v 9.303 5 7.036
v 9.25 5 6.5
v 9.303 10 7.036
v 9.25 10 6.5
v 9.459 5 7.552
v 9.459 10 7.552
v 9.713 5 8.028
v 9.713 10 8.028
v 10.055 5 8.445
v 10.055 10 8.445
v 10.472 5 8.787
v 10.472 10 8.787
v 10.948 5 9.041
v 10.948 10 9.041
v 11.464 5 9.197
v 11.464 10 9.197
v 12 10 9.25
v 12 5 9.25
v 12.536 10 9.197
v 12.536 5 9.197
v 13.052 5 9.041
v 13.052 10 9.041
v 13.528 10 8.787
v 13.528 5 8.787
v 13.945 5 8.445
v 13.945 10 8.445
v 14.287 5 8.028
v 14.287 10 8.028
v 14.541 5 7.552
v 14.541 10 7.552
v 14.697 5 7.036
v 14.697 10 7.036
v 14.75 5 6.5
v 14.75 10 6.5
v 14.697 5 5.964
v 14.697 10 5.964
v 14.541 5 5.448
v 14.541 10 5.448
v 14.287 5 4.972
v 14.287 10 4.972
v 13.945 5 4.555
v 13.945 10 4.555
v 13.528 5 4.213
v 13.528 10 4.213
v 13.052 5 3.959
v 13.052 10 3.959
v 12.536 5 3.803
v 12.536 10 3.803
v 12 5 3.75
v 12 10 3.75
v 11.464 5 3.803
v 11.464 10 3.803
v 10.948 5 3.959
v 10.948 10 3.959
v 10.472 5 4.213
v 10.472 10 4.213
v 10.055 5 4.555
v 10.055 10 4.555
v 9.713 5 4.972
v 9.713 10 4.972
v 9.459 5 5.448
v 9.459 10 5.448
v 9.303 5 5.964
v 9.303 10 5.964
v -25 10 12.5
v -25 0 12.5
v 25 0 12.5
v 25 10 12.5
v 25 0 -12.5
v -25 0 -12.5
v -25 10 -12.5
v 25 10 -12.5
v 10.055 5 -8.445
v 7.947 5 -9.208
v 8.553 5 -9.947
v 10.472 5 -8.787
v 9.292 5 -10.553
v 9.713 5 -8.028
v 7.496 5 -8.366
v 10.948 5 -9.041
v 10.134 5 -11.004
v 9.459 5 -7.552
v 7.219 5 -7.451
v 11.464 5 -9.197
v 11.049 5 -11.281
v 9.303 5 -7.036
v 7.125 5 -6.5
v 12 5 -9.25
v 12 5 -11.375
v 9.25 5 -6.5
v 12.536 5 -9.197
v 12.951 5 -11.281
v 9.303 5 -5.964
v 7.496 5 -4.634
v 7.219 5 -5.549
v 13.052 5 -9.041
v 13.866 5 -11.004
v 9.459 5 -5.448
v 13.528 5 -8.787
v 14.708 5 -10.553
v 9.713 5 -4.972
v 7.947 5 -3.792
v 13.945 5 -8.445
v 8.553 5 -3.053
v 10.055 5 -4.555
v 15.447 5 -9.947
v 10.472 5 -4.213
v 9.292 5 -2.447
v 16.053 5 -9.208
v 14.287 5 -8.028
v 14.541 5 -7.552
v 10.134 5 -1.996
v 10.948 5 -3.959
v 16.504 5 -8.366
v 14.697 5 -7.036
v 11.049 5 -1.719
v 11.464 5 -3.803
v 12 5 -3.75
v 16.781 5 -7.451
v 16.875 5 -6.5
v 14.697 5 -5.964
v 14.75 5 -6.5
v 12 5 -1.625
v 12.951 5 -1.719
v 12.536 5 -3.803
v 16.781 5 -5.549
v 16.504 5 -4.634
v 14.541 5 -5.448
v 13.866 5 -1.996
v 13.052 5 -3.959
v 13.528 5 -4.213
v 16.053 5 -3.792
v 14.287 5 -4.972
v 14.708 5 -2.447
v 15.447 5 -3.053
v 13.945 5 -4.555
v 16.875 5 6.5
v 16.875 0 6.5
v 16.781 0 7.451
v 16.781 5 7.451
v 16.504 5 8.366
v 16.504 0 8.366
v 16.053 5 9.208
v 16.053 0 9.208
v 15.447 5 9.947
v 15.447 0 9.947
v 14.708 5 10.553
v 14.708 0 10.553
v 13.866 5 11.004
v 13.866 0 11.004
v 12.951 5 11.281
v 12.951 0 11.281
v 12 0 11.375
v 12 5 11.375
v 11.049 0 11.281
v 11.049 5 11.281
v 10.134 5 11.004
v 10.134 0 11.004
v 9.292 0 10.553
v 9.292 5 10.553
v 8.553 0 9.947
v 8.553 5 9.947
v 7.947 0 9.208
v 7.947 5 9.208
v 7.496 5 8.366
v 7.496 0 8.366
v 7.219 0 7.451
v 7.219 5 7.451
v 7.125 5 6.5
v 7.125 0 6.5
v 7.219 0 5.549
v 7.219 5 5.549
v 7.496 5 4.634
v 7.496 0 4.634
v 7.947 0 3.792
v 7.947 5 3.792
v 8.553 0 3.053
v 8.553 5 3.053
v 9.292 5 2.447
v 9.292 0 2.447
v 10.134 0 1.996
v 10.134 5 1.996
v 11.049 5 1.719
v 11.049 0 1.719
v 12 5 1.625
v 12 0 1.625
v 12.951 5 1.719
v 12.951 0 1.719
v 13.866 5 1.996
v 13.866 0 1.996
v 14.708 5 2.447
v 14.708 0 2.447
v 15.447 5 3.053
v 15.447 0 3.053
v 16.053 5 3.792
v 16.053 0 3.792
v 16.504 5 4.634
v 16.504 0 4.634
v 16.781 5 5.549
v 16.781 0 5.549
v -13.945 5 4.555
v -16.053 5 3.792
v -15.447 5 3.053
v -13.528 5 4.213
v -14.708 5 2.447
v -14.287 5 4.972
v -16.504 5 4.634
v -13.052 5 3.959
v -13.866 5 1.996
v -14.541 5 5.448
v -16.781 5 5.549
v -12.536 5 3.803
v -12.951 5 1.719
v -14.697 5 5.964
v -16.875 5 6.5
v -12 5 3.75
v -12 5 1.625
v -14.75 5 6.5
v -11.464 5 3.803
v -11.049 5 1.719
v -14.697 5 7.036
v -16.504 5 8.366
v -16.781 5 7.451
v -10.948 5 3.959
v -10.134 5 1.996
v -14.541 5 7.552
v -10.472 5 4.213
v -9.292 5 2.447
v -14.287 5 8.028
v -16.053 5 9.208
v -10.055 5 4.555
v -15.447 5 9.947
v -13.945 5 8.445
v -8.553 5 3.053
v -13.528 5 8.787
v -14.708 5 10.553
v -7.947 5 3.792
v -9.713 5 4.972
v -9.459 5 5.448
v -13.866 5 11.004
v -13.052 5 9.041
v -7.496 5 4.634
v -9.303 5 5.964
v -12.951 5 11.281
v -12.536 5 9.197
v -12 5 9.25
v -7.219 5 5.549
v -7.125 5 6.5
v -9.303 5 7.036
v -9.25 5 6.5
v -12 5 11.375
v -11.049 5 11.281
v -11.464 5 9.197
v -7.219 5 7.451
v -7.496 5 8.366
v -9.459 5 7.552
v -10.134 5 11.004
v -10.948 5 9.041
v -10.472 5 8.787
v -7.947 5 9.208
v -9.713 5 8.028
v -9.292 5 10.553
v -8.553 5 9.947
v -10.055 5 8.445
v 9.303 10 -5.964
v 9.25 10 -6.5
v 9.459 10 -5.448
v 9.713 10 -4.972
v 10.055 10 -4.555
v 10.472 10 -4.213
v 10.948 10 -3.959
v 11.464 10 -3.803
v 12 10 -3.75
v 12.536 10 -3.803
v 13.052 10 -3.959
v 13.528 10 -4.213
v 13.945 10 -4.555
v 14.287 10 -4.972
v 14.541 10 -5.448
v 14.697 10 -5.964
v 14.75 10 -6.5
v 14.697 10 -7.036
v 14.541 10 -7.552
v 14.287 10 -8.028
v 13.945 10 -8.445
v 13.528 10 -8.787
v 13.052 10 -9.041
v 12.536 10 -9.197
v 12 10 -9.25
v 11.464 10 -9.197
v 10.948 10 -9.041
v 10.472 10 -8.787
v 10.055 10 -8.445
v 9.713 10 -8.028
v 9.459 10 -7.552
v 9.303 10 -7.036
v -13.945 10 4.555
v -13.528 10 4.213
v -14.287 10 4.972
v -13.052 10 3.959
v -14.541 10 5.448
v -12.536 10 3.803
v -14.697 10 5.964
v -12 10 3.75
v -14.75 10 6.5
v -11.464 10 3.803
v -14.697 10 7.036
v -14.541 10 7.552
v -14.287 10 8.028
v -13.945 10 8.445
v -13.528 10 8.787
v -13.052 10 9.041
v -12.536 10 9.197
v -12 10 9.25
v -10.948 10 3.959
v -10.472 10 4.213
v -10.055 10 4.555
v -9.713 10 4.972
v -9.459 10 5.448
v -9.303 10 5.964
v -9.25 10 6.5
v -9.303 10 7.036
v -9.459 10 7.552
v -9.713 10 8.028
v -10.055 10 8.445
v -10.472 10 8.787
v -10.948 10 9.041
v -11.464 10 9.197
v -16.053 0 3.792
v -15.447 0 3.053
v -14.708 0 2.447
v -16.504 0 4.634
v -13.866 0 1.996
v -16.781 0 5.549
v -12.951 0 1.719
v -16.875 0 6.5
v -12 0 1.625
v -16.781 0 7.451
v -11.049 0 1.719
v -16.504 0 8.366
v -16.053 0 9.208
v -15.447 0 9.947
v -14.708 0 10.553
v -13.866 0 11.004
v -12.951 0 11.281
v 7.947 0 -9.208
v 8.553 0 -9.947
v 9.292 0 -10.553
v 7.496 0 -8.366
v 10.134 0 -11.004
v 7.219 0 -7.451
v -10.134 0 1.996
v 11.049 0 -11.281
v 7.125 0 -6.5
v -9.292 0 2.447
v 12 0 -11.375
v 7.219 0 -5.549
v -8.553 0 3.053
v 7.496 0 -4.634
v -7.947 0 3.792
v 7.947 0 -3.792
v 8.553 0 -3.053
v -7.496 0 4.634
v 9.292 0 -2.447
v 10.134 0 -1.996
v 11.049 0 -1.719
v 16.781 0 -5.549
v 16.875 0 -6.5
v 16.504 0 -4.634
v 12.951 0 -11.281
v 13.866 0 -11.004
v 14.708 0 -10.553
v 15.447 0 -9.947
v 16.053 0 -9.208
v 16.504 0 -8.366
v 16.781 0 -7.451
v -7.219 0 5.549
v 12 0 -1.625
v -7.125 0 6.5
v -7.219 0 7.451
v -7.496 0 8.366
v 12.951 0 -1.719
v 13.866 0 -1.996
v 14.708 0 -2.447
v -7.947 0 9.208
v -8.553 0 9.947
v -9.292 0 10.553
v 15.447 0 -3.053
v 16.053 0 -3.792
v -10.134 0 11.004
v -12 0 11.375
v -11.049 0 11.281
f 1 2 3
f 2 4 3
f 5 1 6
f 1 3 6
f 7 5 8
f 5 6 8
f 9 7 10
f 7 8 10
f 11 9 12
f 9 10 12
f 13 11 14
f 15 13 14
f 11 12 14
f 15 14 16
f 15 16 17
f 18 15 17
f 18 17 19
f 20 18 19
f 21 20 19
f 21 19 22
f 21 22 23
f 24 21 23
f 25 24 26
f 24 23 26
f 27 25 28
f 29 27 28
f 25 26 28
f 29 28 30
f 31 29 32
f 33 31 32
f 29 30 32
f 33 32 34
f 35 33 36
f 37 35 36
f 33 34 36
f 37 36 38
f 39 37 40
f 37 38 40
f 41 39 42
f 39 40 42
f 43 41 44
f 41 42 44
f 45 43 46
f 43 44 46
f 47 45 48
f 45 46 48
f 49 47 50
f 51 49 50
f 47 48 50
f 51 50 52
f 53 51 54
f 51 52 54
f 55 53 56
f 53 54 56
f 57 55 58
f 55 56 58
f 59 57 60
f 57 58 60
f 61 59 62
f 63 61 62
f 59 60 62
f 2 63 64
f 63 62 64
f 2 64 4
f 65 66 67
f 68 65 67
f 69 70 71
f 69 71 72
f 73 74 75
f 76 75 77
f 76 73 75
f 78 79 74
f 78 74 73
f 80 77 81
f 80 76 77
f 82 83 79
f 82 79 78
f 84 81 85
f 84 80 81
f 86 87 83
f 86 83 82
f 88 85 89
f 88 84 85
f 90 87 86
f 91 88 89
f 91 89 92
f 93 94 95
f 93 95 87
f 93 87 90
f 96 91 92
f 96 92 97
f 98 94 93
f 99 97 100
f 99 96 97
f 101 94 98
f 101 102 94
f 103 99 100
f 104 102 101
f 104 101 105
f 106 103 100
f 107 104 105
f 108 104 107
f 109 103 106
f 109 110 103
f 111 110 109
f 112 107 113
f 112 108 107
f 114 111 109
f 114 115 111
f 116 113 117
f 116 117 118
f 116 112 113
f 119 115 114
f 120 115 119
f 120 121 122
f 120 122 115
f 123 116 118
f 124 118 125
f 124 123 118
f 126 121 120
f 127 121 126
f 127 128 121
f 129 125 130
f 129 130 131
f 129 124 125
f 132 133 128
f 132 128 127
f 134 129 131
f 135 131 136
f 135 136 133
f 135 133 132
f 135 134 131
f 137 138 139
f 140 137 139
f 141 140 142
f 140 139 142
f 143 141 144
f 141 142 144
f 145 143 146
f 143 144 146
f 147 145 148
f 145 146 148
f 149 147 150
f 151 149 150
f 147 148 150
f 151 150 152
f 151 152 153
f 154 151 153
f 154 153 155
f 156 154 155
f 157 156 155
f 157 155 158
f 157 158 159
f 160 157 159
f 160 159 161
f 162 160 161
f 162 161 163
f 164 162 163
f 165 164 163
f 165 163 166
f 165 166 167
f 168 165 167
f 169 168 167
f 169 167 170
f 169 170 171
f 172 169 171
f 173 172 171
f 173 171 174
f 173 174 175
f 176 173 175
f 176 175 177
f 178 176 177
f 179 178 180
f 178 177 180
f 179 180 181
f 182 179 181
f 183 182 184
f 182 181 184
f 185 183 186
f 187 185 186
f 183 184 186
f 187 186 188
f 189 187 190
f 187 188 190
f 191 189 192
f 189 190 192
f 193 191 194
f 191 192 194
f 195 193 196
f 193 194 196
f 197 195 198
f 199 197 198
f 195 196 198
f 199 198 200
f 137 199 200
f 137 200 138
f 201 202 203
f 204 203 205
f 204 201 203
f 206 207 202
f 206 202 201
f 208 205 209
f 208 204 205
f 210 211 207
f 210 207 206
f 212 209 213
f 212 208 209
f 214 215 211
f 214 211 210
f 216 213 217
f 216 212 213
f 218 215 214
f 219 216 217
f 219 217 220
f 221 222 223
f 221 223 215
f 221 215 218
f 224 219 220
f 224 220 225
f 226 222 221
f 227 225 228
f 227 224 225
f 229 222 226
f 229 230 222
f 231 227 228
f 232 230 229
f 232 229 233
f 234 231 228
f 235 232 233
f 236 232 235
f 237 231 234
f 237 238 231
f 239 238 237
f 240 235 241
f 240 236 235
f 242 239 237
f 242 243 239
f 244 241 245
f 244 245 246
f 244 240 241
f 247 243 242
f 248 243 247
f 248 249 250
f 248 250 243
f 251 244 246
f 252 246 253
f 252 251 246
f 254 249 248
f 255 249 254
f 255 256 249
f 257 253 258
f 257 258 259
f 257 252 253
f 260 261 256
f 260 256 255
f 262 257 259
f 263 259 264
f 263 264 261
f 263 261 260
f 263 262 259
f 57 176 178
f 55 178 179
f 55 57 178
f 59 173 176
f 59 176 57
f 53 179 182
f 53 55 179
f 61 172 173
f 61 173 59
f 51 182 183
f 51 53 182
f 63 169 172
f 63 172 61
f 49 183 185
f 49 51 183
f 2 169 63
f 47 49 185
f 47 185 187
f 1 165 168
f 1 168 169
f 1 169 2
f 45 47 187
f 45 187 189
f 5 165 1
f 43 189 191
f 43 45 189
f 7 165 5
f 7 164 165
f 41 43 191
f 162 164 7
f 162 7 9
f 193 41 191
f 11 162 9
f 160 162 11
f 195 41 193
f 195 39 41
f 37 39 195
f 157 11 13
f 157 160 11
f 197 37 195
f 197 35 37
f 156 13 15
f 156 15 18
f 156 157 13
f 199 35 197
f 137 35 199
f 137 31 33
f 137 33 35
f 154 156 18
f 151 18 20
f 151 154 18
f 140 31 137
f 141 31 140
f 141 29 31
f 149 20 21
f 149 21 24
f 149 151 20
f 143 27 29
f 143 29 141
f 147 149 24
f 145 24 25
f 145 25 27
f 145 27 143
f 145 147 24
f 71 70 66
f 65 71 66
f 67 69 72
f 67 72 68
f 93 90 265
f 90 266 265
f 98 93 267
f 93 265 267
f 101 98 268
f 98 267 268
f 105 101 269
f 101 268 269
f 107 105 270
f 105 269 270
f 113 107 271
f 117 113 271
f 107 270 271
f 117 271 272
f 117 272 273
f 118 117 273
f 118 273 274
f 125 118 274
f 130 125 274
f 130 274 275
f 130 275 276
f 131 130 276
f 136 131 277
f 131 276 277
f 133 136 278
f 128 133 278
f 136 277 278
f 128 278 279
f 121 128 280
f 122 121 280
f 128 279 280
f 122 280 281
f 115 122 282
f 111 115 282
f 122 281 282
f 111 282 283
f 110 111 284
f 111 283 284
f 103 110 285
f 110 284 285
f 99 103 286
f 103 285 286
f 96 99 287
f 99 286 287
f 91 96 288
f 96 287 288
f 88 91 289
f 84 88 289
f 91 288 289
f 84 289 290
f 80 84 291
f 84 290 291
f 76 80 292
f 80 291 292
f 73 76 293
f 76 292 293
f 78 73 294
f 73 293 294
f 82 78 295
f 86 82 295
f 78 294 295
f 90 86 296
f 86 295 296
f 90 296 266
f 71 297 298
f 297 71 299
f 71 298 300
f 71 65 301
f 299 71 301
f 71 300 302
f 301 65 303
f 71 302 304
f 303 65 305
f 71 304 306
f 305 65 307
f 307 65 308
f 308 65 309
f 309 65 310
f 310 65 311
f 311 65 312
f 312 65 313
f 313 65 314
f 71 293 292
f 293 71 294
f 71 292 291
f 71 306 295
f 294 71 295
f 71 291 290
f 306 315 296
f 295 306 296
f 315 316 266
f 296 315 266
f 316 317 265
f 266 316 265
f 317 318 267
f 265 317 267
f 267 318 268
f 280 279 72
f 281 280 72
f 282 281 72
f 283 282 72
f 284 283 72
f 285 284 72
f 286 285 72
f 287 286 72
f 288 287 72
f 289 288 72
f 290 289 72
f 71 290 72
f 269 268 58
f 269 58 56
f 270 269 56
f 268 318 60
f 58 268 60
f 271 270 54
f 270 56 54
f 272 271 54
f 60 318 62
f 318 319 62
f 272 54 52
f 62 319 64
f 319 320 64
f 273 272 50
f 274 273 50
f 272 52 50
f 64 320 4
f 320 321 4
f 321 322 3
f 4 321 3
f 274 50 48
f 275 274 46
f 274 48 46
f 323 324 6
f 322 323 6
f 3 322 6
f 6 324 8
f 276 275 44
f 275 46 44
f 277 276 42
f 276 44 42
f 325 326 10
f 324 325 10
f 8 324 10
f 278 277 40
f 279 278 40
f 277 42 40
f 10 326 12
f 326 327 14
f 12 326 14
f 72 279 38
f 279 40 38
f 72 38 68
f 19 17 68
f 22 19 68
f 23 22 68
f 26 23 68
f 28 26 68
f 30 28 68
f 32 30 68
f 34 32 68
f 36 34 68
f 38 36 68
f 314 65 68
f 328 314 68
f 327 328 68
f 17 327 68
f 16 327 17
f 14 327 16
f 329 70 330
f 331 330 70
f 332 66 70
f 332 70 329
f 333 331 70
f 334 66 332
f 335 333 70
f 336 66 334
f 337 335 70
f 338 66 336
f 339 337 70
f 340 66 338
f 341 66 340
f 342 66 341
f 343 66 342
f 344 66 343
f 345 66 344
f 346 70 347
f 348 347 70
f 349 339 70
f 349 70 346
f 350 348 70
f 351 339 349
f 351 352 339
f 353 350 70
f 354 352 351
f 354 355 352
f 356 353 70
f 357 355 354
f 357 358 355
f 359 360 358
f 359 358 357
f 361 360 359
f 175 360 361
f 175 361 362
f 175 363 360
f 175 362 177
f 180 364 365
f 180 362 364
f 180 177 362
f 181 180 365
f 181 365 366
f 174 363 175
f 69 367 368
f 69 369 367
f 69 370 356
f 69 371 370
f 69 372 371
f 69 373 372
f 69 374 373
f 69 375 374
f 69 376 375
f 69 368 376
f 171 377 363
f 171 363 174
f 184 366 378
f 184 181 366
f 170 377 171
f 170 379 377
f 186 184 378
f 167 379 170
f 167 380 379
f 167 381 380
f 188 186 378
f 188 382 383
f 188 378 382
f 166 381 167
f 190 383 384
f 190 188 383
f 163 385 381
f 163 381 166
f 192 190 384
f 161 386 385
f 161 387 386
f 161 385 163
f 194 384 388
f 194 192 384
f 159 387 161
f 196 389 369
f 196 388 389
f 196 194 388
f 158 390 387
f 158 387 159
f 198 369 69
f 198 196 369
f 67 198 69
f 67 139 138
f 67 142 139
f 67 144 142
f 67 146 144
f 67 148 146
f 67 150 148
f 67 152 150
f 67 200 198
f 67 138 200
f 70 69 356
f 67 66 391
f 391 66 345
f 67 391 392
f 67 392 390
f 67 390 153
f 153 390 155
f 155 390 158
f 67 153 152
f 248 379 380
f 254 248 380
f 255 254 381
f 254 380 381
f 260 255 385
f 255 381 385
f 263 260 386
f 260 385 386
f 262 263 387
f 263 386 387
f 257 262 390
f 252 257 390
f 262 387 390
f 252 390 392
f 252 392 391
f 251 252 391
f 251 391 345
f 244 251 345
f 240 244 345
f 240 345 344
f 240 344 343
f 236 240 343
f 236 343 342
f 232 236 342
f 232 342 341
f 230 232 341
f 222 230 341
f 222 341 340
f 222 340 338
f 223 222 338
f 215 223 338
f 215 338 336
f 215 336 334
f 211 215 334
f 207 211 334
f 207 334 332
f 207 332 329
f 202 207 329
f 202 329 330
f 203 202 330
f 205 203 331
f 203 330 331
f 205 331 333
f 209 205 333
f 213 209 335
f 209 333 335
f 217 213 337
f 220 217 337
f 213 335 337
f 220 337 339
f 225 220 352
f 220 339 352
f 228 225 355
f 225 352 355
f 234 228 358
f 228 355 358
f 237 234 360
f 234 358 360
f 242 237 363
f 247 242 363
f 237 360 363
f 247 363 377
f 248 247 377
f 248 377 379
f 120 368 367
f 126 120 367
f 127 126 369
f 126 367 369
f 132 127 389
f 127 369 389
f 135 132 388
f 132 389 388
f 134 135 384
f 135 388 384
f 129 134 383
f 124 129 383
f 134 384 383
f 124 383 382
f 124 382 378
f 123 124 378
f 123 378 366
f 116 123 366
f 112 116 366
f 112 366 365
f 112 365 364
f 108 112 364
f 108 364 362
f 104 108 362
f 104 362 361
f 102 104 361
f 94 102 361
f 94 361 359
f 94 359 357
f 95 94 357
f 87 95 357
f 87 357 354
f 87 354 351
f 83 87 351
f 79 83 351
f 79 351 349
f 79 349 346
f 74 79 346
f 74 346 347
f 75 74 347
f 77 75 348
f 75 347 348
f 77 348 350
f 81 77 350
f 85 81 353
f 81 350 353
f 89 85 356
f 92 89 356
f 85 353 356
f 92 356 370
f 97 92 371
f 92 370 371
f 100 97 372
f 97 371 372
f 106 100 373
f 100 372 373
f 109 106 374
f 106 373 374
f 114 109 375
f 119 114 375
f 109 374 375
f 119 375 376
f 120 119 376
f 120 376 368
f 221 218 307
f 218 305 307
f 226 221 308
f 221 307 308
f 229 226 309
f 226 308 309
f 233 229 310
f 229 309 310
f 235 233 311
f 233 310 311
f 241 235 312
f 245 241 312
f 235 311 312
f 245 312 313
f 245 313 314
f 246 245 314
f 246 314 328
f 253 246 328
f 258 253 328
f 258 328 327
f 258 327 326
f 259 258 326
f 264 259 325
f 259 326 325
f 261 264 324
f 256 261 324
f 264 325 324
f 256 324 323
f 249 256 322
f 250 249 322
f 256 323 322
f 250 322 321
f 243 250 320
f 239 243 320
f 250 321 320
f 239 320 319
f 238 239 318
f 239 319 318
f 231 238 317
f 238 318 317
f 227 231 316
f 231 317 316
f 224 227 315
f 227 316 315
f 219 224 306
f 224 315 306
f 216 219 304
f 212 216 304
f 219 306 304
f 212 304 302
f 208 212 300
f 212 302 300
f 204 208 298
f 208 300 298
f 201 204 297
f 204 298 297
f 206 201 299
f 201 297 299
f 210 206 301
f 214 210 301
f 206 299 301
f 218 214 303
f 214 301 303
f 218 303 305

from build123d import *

# Parameters (mm, degrees)
F0_W           = 50
F0_H           = 25
F1_DEPTH       = 10
F2_D           = 5.5
F2_DEPTH       = 14
F2_CBORE_D     = 9.75
F2_CBORE_DEPTH = 5
F2_TIP         = 1.6523667023


with BuildPart() as f1:
    # F0 (on Front) → F1 (new body)
    with BuildSketch(Plane.XZ):
        Rectangle(F0_W, F0_H)
    extrude(amount=-F1_DEPTH)

    # F2
    with Locations(Plane.XZ):
        with Locations((-12, 6.5), (12, 6.5), (12, -6.5)):
            CounterBoreHole(F2_D / 2, F2_CBORE_D / 2, F2_CBORE_DEPTH, depth=F2_DEPTH)
            with Locations((0, 0, -(F2_DEPTH + F2_TIP / 2))):  # 118° drill point
                Cone(0, F2_D / 2, F2_TIP, mode=Mode.SUBTRACT)


solid = f1.part
